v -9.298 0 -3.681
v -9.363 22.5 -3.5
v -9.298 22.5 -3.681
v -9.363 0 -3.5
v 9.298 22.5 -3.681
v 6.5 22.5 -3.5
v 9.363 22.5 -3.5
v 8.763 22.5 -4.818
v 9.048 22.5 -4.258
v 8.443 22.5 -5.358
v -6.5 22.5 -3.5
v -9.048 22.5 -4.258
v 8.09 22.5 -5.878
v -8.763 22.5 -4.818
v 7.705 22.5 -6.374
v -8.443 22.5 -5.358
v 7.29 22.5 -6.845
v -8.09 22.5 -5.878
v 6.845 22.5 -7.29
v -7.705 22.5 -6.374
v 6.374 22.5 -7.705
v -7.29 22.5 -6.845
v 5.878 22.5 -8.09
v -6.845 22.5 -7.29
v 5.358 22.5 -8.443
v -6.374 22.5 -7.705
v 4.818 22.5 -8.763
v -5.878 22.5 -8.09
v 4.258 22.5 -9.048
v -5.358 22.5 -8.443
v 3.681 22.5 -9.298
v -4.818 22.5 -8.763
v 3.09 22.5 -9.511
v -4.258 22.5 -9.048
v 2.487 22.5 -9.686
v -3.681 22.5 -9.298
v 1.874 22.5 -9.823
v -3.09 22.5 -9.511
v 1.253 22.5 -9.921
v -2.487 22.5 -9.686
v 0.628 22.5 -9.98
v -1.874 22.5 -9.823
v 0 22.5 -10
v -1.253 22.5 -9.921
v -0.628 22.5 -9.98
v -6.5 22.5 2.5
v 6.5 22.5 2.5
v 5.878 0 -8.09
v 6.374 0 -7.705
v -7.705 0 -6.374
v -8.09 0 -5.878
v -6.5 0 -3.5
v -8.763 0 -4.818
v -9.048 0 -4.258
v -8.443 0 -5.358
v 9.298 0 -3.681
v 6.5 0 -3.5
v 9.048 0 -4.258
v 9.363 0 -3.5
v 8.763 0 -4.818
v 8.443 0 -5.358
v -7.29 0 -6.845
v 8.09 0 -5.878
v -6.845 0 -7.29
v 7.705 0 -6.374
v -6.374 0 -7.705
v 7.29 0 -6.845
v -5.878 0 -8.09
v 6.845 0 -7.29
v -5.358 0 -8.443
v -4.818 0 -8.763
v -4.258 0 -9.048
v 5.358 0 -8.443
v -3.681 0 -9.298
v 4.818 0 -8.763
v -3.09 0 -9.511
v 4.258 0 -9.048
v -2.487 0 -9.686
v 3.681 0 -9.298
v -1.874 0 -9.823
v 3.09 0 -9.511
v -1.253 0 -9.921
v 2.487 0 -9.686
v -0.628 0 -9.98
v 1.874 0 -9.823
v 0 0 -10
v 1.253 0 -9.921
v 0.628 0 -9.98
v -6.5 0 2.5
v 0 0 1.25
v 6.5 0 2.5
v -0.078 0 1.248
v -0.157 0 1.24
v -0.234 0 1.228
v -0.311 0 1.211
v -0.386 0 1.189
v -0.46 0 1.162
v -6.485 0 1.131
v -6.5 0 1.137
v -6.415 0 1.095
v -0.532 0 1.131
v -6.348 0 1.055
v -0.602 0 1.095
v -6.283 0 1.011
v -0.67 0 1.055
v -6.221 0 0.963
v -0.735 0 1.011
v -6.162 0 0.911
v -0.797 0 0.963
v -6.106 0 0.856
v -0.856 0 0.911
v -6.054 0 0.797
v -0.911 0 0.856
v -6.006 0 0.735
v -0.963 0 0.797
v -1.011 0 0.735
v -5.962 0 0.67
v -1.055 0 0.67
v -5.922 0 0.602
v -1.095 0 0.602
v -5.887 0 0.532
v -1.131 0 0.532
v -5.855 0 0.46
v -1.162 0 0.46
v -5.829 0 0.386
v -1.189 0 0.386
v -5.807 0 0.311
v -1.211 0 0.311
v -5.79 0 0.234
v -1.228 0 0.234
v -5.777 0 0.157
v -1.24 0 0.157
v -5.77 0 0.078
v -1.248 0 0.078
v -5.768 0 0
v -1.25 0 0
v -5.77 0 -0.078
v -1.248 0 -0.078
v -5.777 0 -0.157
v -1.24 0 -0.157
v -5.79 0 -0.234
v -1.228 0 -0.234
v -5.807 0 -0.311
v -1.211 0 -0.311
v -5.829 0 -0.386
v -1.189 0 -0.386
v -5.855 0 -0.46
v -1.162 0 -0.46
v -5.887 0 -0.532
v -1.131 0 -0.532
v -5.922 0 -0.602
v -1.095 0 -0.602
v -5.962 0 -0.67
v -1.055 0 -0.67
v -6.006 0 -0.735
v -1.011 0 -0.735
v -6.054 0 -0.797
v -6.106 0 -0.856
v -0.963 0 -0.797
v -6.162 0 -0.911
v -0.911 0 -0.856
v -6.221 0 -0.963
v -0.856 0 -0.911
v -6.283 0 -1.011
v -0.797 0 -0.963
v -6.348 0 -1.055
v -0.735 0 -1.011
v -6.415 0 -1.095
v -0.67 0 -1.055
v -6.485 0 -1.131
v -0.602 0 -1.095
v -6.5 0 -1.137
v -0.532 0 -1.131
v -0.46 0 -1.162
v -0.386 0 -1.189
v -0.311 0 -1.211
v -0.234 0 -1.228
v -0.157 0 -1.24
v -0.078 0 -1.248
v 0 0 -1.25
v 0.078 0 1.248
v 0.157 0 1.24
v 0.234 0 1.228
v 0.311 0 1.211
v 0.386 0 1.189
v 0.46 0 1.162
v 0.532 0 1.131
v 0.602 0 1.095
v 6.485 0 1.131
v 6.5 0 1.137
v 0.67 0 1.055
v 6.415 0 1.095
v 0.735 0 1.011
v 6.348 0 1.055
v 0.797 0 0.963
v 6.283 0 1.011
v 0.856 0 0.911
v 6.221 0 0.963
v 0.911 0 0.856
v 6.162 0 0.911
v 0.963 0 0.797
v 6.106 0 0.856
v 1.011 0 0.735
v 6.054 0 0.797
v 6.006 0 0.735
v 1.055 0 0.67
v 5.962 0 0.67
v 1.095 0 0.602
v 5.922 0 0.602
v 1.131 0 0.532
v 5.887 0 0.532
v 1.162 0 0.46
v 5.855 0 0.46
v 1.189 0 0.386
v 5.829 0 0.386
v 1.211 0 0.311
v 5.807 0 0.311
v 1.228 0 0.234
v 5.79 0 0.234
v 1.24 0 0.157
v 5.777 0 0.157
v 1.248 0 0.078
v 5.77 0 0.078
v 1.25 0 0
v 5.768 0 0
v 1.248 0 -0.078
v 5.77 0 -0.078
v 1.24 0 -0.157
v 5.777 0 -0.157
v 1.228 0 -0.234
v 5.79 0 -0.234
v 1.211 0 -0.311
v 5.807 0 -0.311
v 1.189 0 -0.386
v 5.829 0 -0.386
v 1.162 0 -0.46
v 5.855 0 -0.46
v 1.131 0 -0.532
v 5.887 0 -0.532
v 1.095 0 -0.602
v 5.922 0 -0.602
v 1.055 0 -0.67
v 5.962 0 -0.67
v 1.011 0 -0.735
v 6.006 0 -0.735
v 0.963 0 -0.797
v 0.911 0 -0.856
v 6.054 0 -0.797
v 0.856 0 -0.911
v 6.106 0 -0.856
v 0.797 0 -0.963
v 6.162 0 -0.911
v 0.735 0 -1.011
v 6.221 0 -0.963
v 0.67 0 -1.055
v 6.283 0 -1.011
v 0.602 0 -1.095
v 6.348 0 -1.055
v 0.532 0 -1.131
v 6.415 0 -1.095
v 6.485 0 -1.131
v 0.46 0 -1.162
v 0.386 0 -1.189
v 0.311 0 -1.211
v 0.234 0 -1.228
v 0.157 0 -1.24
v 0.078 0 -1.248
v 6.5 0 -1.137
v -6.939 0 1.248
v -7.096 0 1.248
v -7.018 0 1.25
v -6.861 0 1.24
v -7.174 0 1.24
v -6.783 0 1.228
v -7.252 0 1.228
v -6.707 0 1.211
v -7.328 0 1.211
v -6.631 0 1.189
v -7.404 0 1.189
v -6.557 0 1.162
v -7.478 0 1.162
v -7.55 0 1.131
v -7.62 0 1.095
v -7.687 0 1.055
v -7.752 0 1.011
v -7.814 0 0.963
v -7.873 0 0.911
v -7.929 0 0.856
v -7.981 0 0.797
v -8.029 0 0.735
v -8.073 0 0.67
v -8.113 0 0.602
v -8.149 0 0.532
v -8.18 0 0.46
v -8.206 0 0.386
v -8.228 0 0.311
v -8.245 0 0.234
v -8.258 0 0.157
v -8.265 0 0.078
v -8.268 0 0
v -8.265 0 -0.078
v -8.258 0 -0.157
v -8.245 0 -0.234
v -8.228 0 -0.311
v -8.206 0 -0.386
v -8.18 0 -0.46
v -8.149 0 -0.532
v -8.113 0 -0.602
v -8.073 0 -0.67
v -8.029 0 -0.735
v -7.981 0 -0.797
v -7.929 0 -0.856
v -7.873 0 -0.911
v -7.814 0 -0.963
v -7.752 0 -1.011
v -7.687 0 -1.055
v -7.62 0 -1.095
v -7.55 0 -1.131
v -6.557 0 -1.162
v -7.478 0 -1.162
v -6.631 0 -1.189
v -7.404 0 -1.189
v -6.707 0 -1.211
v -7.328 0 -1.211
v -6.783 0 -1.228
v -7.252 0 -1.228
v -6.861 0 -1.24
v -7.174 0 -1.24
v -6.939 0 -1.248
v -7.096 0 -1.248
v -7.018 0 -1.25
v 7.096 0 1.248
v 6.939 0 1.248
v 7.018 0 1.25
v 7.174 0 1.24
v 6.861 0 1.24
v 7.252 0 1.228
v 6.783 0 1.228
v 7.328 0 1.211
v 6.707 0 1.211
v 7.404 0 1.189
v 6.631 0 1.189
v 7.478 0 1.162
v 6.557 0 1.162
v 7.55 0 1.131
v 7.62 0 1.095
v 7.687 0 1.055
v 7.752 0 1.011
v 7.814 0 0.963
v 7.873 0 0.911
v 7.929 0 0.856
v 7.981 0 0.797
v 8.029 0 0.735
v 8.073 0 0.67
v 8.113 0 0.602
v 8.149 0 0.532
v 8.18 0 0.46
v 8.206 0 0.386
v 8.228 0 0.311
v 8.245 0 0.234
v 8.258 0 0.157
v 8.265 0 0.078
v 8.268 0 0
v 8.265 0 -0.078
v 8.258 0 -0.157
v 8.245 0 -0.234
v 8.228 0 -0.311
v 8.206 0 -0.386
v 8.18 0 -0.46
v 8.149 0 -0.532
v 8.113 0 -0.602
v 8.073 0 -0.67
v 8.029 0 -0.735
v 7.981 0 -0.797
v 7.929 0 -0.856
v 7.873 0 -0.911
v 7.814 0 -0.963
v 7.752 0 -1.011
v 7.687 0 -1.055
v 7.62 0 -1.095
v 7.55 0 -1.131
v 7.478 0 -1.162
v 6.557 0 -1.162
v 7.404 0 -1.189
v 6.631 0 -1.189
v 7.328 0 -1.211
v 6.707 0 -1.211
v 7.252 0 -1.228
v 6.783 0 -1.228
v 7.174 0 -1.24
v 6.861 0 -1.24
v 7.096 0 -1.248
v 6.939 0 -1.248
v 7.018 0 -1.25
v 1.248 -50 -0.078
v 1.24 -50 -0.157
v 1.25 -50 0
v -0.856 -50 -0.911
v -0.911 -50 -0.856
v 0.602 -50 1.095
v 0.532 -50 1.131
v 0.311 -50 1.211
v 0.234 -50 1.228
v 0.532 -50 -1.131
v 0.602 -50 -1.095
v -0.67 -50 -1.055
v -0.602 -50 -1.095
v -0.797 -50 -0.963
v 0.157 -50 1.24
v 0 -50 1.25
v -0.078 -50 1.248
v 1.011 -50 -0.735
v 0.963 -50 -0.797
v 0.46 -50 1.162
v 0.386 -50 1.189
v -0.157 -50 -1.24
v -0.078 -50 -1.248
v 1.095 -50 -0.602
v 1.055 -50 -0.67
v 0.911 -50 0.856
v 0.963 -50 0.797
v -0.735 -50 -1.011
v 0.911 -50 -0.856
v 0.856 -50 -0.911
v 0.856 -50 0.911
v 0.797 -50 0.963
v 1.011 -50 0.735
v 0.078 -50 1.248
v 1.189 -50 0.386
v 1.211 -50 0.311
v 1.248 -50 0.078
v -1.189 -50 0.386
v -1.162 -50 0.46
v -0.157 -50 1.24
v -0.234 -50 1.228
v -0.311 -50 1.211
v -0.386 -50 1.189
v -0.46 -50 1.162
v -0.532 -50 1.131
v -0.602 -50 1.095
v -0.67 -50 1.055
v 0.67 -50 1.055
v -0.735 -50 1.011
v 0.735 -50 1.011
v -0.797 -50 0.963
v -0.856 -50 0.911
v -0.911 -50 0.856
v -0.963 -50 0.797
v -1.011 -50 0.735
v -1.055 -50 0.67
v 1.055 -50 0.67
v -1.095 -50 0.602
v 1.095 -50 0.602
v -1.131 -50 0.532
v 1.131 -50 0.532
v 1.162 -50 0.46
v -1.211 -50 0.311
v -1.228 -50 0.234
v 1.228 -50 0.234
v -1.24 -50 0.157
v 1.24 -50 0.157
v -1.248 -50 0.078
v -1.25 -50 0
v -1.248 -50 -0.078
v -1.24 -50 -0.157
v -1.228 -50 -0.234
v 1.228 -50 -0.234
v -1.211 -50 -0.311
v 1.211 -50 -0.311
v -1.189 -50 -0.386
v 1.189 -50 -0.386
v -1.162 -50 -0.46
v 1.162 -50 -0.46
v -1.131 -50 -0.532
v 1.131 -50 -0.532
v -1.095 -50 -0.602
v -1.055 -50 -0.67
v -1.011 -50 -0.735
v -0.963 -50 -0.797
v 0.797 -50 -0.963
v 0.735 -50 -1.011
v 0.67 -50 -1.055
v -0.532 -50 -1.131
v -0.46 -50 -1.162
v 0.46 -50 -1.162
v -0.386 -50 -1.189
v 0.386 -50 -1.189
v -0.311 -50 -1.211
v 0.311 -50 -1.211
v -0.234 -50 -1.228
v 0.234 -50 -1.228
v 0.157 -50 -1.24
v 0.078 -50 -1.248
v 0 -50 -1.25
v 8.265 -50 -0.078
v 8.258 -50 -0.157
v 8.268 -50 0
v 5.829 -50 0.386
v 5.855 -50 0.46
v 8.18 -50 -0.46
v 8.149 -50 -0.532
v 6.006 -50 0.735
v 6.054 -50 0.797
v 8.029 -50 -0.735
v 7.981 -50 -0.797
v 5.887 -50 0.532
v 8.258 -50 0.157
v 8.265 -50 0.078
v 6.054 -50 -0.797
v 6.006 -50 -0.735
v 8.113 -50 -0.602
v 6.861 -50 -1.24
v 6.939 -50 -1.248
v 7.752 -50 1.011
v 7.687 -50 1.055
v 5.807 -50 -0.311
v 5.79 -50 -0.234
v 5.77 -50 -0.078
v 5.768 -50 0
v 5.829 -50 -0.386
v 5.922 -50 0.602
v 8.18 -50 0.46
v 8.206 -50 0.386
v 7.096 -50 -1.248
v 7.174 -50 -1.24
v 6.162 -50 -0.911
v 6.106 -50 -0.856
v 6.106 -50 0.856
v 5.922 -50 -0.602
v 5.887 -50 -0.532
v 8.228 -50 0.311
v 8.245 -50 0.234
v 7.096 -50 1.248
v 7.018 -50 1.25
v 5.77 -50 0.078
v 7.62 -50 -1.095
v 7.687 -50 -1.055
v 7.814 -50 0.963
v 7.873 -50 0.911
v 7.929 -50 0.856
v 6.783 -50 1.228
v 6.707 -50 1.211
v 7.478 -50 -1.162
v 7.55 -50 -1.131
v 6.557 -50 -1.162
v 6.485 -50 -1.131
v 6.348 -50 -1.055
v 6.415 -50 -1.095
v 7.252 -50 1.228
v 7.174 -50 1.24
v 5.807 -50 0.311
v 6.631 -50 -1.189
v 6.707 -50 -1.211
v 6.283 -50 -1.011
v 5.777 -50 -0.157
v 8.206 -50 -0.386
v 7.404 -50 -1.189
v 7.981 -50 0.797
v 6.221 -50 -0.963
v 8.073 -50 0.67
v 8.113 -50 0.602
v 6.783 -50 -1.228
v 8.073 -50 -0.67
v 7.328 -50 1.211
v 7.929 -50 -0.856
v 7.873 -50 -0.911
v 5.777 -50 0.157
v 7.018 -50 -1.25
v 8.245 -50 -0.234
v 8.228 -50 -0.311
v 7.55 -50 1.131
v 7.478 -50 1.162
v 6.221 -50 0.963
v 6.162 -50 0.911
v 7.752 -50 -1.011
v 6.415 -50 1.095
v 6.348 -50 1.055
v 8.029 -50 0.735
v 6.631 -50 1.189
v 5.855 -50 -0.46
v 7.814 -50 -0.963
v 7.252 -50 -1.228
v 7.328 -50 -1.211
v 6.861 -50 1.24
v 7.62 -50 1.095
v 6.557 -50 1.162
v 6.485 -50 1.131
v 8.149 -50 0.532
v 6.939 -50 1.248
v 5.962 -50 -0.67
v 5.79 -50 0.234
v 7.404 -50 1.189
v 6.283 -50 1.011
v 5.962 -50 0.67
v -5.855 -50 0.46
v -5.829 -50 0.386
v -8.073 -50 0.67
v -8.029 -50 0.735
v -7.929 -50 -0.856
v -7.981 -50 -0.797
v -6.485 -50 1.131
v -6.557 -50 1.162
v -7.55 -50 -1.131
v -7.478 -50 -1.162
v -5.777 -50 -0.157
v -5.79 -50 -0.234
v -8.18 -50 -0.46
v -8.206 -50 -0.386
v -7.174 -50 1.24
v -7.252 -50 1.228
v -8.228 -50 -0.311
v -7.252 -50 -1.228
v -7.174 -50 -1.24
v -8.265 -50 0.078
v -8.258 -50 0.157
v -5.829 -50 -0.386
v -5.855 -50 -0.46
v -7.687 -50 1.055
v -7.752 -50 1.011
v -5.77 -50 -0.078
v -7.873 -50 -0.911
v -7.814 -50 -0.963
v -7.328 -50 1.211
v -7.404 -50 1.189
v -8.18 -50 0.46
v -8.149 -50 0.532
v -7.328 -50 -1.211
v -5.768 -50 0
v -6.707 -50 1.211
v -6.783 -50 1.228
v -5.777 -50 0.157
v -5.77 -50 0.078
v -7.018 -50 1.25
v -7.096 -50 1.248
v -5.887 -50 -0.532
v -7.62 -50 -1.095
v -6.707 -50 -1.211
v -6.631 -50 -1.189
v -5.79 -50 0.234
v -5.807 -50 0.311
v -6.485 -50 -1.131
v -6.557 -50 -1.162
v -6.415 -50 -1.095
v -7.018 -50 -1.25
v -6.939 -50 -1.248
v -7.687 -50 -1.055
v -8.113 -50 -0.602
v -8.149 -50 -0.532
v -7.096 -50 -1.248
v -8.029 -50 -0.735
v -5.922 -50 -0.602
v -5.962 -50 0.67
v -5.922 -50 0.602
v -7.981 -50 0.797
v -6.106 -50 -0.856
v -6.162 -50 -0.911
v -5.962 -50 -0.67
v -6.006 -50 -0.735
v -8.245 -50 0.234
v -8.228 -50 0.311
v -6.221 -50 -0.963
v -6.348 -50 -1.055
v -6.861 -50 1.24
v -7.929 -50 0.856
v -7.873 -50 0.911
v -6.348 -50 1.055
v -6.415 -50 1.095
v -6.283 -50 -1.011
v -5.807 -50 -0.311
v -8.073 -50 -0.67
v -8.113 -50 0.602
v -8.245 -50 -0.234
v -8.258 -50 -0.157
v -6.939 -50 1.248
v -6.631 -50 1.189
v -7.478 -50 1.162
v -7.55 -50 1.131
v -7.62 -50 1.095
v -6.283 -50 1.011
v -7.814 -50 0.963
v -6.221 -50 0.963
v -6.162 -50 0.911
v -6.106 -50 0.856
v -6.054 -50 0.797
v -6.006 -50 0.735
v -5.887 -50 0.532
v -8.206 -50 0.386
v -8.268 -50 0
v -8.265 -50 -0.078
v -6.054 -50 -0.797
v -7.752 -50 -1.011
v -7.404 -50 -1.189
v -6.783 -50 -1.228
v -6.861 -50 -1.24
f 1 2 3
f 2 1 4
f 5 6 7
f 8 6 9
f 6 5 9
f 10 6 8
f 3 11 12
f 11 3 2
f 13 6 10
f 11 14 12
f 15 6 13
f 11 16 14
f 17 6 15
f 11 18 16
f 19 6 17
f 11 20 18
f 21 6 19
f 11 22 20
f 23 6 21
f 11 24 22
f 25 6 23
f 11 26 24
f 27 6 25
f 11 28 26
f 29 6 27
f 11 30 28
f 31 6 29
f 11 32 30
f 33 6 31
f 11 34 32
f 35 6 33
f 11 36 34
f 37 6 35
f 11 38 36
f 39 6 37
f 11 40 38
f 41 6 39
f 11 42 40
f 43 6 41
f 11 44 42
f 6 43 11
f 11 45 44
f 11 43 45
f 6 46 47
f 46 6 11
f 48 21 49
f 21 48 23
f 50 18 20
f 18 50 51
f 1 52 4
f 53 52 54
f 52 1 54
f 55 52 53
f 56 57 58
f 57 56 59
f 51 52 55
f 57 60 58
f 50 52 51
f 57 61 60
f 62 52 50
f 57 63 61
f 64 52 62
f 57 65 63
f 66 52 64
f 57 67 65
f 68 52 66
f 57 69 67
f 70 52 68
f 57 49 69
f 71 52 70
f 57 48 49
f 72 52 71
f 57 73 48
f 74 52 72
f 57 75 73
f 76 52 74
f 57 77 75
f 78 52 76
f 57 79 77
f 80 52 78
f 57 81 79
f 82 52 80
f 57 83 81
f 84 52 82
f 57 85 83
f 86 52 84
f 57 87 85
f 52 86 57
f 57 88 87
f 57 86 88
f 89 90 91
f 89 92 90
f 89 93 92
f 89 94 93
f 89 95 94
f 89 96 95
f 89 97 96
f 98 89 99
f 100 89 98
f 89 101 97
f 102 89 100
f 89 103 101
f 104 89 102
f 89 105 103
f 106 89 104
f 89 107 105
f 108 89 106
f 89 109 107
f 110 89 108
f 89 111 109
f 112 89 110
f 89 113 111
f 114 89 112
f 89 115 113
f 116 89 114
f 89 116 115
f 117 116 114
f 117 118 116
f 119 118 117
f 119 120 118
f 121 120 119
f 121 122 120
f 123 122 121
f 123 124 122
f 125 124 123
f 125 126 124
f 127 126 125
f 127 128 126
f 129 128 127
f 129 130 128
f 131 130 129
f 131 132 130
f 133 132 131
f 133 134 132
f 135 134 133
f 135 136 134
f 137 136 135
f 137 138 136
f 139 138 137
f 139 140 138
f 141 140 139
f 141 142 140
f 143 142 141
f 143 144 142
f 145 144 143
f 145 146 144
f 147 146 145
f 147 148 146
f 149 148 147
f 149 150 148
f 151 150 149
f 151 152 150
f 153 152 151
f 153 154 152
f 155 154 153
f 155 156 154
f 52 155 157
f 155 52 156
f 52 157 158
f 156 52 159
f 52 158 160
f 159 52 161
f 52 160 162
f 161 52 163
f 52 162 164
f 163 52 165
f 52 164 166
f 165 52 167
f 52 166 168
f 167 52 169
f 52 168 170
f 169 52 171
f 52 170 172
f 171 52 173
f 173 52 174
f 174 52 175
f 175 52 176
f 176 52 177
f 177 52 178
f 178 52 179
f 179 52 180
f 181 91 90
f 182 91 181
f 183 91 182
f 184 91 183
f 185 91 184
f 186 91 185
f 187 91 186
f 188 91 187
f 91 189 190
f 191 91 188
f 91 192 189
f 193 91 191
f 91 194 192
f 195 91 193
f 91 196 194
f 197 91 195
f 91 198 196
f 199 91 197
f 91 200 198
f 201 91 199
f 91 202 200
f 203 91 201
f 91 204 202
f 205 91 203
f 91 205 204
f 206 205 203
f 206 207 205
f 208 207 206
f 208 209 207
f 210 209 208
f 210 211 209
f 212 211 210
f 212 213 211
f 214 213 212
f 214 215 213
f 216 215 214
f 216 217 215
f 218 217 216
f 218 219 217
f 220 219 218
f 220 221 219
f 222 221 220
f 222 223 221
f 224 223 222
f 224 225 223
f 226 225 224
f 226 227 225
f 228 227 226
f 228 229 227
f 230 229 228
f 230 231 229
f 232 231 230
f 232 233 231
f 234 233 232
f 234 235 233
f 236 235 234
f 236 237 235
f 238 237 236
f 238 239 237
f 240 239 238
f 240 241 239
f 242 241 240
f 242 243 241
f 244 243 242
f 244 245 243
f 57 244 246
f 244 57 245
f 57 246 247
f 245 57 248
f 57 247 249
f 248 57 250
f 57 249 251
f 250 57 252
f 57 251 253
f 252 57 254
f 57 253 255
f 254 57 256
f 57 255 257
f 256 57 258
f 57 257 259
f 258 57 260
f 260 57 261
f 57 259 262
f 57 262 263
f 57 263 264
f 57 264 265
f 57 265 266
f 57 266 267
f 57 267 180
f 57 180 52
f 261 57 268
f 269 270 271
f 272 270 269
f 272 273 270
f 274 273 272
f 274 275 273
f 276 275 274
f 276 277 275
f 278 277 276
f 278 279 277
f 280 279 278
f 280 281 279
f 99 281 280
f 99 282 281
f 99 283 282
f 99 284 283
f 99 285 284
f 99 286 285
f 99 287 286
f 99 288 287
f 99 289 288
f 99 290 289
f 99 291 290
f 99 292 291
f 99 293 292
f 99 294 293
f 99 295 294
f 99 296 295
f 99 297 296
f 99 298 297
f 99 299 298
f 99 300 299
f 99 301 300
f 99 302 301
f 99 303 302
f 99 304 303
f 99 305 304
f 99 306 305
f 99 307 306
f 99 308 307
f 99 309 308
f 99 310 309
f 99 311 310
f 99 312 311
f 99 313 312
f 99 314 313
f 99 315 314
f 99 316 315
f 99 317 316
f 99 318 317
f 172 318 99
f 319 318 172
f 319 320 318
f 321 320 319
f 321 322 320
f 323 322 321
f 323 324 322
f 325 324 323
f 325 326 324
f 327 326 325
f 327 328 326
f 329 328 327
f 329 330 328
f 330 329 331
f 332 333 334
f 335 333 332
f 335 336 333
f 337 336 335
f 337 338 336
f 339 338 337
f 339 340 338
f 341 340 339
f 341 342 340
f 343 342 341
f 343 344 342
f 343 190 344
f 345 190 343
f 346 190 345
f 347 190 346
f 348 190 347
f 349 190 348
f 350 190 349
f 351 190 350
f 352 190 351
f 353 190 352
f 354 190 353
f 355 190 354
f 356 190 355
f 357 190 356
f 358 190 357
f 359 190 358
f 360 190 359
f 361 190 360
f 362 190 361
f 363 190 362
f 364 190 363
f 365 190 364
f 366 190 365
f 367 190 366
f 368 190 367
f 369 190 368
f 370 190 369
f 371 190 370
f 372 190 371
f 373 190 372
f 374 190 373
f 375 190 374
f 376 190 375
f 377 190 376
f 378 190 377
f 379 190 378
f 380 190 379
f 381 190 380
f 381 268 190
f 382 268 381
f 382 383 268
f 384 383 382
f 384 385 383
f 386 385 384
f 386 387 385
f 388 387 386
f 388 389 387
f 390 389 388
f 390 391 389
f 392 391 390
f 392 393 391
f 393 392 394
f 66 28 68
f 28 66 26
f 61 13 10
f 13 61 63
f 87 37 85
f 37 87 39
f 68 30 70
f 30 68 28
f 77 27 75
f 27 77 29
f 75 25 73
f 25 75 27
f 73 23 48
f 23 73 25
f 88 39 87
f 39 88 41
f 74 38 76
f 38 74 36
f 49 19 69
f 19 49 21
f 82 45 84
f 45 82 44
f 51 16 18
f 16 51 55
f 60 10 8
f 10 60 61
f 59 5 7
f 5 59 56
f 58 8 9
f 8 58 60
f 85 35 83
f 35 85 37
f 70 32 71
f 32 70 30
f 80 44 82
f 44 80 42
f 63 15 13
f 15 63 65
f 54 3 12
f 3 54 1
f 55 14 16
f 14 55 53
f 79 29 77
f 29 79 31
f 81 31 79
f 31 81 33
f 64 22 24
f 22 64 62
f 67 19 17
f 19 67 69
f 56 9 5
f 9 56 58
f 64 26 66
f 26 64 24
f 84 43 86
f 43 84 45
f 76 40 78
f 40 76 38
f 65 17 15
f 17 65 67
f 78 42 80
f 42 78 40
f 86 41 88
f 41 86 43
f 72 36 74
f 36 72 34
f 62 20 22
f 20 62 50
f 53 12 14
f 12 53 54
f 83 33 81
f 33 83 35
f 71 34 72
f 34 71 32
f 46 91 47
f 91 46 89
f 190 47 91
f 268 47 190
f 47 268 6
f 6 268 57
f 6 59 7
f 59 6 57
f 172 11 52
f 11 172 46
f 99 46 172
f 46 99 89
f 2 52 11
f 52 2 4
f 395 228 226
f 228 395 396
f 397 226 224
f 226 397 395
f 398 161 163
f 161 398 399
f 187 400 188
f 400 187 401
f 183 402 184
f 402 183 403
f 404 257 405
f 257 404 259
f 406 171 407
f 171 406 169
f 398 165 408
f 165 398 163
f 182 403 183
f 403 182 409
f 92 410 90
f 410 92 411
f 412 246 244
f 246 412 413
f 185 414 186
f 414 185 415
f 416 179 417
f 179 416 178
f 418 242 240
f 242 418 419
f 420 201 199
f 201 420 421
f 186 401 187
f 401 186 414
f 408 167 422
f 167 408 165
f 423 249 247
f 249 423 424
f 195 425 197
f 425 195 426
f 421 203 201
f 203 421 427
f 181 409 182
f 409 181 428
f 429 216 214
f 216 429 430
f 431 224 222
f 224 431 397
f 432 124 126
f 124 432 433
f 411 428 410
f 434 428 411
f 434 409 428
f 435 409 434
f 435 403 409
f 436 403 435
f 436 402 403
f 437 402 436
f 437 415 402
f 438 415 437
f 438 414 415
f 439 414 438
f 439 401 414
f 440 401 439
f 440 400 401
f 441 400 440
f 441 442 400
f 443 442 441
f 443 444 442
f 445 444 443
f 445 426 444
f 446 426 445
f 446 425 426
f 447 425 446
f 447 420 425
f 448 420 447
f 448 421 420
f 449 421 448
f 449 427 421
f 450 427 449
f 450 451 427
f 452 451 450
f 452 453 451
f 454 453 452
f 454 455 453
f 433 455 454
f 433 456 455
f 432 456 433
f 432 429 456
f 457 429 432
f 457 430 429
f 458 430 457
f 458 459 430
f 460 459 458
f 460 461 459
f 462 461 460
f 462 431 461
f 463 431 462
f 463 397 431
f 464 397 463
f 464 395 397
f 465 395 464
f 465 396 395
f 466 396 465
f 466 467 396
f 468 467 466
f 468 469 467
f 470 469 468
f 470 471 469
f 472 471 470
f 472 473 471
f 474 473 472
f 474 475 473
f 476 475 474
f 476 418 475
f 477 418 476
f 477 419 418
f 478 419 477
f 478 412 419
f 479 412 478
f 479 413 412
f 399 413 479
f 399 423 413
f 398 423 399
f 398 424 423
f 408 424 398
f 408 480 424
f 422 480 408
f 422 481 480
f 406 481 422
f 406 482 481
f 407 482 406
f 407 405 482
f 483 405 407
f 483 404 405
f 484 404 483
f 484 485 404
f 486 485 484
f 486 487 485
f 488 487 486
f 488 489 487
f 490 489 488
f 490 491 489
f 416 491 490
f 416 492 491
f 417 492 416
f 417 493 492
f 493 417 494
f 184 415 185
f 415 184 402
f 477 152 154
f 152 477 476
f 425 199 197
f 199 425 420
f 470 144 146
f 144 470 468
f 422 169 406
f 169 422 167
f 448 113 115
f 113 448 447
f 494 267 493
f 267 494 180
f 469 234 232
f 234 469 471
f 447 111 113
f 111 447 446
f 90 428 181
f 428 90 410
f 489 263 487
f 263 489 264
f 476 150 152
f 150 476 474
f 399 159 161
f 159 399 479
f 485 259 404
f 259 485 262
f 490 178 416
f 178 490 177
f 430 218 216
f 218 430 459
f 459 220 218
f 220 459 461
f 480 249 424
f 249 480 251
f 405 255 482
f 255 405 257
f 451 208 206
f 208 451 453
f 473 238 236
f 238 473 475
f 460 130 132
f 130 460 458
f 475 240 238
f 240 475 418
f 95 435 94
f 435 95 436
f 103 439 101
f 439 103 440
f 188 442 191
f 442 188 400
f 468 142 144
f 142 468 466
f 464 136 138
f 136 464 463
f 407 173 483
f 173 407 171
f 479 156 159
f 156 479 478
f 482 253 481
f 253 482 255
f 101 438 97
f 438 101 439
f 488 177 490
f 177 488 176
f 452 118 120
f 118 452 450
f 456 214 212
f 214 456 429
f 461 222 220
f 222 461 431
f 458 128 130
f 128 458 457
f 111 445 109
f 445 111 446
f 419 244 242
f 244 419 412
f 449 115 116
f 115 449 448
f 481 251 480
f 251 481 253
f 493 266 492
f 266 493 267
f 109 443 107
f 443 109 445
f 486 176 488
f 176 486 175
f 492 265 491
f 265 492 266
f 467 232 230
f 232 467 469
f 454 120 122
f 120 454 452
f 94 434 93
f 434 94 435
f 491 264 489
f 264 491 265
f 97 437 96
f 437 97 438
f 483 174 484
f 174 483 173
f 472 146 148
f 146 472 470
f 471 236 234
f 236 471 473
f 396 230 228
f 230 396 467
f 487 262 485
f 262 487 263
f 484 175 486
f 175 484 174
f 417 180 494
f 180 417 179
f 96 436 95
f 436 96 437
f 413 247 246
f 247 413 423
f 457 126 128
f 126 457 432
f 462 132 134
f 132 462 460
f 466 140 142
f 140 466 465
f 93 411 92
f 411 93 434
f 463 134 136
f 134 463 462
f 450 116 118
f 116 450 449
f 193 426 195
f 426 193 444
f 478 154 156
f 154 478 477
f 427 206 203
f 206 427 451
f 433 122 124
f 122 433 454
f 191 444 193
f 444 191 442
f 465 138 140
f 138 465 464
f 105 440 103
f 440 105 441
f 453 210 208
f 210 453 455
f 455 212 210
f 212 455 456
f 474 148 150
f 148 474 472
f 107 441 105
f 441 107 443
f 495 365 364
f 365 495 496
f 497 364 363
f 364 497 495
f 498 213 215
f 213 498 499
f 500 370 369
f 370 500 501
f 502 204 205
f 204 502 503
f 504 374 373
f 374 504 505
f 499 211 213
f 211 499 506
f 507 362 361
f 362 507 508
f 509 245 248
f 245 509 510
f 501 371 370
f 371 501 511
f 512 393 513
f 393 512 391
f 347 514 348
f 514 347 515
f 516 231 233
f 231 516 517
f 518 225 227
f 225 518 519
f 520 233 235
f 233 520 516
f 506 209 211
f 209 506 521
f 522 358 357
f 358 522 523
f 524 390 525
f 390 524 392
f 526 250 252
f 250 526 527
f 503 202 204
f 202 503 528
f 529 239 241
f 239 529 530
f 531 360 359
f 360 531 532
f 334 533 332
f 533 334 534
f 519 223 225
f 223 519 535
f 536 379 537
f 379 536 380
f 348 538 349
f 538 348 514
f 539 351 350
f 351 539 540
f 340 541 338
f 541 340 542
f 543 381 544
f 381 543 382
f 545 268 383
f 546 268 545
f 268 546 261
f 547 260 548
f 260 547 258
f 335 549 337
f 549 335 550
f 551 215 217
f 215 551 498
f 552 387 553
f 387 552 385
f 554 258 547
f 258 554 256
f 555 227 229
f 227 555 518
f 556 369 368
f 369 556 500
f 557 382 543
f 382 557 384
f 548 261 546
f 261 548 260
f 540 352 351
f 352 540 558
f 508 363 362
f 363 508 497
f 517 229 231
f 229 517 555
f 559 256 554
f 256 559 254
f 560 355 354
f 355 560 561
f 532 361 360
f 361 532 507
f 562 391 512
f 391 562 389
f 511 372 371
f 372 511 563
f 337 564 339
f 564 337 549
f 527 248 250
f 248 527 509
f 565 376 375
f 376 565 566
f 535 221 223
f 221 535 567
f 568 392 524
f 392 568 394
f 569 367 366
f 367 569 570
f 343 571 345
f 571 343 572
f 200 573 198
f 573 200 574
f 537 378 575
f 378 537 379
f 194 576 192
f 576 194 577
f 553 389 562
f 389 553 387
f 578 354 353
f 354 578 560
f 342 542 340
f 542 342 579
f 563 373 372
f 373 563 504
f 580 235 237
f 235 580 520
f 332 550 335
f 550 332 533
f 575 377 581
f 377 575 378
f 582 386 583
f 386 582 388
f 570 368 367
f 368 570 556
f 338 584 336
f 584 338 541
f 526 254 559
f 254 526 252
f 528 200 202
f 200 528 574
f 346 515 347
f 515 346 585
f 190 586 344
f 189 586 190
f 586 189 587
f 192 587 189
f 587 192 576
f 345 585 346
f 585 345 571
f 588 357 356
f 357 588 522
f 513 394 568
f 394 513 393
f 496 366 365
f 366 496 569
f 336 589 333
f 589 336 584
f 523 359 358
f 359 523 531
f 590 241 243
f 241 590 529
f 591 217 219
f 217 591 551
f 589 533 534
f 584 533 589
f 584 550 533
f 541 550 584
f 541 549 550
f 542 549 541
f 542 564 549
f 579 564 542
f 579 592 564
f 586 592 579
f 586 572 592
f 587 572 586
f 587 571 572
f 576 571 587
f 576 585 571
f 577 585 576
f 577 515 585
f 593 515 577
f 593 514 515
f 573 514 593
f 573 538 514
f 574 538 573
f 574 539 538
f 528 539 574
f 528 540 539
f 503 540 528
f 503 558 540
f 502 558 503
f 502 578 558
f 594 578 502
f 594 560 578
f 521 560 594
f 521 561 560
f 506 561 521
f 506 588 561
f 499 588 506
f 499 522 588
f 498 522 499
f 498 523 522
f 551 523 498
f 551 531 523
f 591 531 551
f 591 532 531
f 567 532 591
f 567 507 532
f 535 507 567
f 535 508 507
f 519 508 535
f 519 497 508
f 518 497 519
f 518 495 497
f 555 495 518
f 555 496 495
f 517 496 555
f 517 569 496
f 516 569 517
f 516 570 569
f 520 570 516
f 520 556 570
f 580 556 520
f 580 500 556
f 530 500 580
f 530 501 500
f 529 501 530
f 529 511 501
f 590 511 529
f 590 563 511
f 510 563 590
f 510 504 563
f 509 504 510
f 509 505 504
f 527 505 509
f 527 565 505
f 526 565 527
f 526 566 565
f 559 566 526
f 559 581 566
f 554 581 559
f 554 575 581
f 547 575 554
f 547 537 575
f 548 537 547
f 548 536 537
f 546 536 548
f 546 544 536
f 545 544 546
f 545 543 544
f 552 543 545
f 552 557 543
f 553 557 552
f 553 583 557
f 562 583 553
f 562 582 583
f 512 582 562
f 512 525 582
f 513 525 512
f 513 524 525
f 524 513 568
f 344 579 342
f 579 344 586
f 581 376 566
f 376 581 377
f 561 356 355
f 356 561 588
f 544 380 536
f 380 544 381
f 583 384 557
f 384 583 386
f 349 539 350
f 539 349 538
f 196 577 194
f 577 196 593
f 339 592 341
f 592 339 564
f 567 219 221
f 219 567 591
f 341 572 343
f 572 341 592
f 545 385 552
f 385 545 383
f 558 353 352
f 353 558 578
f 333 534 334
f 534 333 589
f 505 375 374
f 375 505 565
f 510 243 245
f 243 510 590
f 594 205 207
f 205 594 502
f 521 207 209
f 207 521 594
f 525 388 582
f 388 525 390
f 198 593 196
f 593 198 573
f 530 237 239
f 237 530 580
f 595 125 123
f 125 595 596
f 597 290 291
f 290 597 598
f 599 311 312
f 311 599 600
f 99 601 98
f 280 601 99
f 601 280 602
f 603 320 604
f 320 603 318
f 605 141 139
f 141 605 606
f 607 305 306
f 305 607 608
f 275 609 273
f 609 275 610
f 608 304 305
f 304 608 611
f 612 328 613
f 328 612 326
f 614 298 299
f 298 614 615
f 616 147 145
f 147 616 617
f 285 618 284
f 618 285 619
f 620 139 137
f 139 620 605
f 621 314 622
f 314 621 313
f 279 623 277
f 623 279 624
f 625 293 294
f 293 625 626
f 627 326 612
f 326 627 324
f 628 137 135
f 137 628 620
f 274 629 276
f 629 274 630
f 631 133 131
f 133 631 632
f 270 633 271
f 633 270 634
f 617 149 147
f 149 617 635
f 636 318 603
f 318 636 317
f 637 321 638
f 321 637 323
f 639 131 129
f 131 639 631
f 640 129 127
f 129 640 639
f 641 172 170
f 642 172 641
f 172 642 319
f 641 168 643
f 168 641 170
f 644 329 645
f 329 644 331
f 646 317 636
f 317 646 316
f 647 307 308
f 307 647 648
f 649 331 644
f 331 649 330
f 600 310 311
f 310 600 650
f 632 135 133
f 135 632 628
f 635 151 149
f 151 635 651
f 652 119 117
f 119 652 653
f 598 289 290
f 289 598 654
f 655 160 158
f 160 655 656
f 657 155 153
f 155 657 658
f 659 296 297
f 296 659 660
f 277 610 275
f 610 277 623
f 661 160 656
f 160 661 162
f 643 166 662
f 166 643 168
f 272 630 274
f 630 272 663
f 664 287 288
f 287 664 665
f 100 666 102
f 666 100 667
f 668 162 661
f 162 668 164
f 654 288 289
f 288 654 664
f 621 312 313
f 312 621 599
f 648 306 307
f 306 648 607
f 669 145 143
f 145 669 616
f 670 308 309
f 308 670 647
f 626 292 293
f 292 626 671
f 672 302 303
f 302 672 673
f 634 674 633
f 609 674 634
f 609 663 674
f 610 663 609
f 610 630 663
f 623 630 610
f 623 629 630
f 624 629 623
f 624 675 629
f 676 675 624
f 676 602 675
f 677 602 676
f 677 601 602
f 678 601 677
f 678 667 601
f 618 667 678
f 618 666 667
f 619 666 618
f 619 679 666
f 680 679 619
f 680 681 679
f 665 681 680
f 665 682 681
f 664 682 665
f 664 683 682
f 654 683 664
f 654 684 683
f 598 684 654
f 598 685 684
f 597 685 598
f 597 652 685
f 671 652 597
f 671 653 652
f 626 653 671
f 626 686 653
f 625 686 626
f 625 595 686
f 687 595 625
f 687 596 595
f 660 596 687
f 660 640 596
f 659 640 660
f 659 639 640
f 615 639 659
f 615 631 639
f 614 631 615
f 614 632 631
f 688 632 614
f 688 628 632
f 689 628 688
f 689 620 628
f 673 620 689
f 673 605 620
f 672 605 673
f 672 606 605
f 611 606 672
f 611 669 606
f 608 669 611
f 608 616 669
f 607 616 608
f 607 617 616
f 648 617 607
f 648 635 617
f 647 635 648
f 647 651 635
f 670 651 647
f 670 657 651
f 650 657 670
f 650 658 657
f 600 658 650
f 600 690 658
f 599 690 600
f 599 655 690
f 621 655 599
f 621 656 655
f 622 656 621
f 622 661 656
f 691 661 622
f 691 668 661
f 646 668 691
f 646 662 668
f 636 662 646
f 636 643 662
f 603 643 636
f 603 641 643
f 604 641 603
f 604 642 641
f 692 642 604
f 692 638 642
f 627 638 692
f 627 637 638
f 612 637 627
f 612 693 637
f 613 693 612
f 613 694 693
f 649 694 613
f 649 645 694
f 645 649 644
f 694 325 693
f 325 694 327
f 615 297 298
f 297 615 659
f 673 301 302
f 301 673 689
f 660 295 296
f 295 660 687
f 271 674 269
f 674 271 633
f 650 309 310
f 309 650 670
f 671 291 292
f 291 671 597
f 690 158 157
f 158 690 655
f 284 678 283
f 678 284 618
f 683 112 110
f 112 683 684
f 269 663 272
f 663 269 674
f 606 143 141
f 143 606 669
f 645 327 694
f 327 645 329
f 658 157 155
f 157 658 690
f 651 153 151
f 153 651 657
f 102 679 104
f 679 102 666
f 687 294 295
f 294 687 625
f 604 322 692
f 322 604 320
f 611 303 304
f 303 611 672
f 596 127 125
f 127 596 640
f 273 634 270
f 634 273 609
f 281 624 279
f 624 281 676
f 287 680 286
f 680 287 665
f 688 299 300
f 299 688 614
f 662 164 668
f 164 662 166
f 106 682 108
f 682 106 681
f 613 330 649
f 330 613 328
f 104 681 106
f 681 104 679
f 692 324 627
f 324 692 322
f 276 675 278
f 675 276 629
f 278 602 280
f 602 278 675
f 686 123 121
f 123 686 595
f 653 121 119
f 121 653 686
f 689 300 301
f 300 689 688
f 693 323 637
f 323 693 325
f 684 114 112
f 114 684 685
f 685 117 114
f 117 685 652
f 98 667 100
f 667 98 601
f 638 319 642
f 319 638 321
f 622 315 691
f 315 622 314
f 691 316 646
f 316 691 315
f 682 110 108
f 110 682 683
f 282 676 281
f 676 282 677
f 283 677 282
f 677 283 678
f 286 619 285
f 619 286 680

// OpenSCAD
// Units in mm.
unit=0.5;
diode_diameter = 40*unit;
diode_height = 45*unit;
cutoutf_y=15*unit;
cutoutf_x = diode_diameter/2;
cutoutf_ys = diode_diameter - cutoutf_x;
cutouts_x = 3.5*unit*2;
cutouts_y = diode_diameter;
cutouts_ys = diode_diameter - cutouts_x;
pindiameter=2.5*unit;
pinheight=2.5*diode_diameter;
pinoffsetx = diode_diameter/2.85;
ff=0.1;    // fudge factor

rotate([-90,0,0]){
color([0.45,0.45,0.45]) {
difference() {
  difference() {
    difference() {
      cylinder(r=diode_diameter/2, h=diode_height, $fn=100);
      translate([-cutoutf_x, -cutoutf_ys, -ff/2]) cube([diode_diameter, cutoutf_y, diode_height+ff]);
    }
    translate([(diode_diameter/2)-cutouts_x,-cutouts_ys, -ff/2]) cube([cutouts_x, cutouts_y, diode_height+ff]);
  }
  translate([(-diode_diameter/2),-cutouts_ys, -ff/2]) cube([cutouts_x, cutouts_y, diode_height+ff]);
}
}

 color([0.95,0.95,0.95]) {
  translate([0,0,-pinheight]) cylinder(r=pindiameter, h=pinheight, $fn=100);
  translate([pinoffsetx,0,-pinheight]) cylinder(r=pindiameter, h=pinheight, $fn=100);
 translate([-pinoffsetx,0,-pinheight]) cylinder(r=pindiameter, h=pinheight, $fn=100);   
}
}

// Make the Emitter black, since it goes to GND
color([0,0,0])
translate([-2.6*pinoffsetx,-(1.25*pinheight)]){text("E", size=12,font="Liberation Sans:style=Bold");}

// Make the Base green, since it carries the signal from the Arduino
color([0,1,0])
translate([-0.70*pinoffsetx,-(1.30*pinheight)]){text("B", size=12,font="Liberation Sans:style=Bold");}

// Make the collector red, since it controls power
color([1,0,0])
translate([1.25*pinoffsetx,-(1.25*pinheight)]){text("C", size=12,font="Liberation Sans:style=Bold");}
